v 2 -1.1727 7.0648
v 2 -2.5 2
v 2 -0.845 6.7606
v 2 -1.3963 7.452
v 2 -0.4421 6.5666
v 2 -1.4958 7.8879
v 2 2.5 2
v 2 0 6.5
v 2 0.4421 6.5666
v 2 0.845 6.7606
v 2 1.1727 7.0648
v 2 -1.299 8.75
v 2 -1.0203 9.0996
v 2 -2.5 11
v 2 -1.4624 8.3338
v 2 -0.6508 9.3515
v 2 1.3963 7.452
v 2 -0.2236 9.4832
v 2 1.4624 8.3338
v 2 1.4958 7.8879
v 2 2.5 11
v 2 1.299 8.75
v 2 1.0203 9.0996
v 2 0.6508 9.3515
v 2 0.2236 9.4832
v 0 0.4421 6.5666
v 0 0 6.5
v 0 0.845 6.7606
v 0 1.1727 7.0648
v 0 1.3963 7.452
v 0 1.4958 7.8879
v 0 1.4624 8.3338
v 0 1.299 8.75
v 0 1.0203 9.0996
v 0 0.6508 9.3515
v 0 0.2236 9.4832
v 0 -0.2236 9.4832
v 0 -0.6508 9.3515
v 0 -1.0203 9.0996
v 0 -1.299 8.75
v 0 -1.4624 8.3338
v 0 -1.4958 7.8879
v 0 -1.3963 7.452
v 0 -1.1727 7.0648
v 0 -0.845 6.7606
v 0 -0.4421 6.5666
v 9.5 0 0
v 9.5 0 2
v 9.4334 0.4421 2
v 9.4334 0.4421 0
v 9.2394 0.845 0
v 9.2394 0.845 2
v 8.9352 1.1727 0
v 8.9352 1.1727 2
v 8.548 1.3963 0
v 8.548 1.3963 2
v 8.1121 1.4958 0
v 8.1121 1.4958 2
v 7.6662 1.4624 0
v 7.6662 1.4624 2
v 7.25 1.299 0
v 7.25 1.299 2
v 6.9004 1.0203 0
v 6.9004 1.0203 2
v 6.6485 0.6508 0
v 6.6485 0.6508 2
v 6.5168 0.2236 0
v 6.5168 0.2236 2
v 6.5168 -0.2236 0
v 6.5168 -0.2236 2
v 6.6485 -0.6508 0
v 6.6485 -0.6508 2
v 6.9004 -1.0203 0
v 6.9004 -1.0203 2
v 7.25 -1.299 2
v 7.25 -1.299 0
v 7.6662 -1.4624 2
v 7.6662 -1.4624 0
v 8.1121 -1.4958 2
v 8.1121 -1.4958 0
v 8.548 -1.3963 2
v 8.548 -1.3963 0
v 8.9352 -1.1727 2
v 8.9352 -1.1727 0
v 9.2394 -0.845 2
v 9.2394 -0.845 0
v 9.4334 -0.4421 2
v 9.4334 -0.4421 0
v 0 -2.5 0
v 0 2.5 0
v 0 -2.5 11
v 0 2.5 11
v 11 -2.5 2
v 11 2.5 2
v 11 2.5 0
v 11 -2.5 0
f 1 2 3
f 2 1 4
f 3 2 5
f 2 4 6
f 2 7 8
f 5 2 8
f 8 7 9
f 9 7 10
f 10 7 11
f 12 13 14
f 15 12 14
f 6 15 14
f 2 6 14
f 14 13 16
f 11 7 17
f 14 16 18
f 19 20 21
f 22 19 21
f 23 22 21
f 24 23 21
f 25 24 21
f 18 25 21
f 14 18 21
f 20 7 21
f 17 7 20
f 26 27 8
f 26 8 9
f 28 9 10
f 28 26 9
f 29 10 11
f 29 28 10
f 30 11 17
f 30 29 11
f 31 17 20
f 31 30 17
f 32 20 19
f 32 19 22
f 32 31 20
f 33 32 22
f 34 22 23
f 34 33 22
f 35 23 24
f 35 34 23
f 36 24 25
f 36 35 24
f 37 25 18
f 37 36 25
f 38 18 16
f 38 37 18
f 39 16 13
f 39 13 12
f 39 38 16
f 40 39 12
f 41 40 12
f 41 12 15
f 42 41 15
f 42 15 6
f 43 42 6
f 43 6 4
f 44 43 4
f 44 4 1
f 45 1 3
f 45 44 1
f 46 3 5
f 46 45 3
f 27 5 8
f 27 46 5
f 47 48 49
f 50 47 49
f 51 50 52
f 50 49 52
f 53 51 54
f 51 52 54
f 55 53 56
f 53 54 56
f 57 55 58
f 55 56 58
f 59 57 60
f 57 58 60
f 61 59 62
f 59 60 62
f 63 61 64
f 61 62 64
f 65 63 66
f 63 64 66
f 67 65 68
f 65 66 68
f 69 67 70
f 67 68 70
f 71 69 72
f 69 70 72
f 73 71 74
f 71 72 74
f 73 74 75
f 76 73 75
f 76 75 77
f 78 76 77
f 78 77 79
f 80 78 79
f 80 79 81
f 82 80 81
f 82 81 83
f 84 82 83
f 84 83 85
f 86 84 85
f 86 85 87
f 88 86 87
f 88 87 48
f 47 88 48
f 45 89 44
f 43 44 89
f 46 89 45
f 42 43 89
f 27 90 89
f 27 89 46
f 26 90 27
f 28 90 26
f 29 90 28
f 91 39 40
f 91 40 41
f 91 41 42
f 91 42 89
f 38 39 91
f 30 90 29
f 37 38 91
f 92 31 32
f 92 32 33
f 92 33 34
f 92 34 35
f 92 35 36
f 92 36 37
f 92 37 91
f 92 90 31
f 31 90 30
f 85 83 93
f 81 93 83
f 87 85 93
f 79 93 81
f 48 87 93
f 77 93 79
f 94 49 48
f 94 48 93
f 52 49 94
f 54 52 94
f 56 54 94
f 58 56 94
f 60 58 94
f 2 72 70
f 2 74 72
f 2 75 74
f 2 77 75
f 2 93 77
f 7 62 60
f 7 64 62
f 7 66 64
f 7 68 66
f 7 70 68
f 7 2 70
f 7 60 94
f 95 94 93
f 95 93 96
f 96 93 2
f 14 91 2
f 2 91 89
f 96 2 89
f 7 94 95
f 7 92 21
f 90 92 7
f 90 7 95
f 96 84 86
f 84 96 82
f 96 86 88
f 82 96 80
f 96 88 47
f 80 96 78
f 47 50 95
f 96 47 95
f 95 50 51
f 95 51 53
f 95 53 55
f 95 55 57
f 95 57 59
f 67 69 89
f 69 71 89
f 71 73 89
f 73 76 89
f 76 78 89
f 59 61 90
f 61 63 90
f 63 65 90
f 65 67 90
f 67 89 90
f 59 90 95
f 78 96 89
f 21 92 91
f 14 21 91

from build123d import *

# Parameters (mm, degrees)
SKETCH_1_R          = 1.5
EXTRUDE_1_DEPTH     = 2
SKETCH_2_W          = 2
SKETCH_2_H          = 5
EXTRUDE_2_DEPTH     = 9
SKETCH_3_R          = 1.5
CUT_EXTRUDE_1_DEPTH = 6


with BuildPart() as part:
    # 草图1 → 凸台-拉伸1 (new body)
    with BuildSketch(Plane(origin=(0, 0, 0), x_dir=(0, 0, -1), z_dir=(1, 0, 0))):
        Polygon((-11, 0), (-11, 2.5), (0, 2.5), (0, 0), (0, -2.5), (-11, -2.5), align=None)
        with Locations((-8, 0)):
            Circle(SKETCH_1_R, mode=Mode.SUBTRACT)
    extrude(amount=EXTRUDE_1_DEPTH)

    # 草图2 → 凸台-拉伸2 (add)
    with BuildSketch(Plane(origin=(2, 0, 0), x_dir=(0, 0, -1), z_dir=(1, 0, 0))):
        with Locations((-1, 0)):
            Rectangle(SKETCH_2_W, SKETCH_2_H)
    extrude(amount=EXTRUDE_2_DEPTH)

    # 草图3 → 切除-拉伸1 (cut)
    with BuildSketch(Plane.XY.offset(2)):
        with Locations((8, 0)):
            Circle(SKETCH_3_R)
    extrude(amount=-CUT_EXTRUDE_1_DEPTH, mode=Mode.SUBTRACT)


solid = part.part
